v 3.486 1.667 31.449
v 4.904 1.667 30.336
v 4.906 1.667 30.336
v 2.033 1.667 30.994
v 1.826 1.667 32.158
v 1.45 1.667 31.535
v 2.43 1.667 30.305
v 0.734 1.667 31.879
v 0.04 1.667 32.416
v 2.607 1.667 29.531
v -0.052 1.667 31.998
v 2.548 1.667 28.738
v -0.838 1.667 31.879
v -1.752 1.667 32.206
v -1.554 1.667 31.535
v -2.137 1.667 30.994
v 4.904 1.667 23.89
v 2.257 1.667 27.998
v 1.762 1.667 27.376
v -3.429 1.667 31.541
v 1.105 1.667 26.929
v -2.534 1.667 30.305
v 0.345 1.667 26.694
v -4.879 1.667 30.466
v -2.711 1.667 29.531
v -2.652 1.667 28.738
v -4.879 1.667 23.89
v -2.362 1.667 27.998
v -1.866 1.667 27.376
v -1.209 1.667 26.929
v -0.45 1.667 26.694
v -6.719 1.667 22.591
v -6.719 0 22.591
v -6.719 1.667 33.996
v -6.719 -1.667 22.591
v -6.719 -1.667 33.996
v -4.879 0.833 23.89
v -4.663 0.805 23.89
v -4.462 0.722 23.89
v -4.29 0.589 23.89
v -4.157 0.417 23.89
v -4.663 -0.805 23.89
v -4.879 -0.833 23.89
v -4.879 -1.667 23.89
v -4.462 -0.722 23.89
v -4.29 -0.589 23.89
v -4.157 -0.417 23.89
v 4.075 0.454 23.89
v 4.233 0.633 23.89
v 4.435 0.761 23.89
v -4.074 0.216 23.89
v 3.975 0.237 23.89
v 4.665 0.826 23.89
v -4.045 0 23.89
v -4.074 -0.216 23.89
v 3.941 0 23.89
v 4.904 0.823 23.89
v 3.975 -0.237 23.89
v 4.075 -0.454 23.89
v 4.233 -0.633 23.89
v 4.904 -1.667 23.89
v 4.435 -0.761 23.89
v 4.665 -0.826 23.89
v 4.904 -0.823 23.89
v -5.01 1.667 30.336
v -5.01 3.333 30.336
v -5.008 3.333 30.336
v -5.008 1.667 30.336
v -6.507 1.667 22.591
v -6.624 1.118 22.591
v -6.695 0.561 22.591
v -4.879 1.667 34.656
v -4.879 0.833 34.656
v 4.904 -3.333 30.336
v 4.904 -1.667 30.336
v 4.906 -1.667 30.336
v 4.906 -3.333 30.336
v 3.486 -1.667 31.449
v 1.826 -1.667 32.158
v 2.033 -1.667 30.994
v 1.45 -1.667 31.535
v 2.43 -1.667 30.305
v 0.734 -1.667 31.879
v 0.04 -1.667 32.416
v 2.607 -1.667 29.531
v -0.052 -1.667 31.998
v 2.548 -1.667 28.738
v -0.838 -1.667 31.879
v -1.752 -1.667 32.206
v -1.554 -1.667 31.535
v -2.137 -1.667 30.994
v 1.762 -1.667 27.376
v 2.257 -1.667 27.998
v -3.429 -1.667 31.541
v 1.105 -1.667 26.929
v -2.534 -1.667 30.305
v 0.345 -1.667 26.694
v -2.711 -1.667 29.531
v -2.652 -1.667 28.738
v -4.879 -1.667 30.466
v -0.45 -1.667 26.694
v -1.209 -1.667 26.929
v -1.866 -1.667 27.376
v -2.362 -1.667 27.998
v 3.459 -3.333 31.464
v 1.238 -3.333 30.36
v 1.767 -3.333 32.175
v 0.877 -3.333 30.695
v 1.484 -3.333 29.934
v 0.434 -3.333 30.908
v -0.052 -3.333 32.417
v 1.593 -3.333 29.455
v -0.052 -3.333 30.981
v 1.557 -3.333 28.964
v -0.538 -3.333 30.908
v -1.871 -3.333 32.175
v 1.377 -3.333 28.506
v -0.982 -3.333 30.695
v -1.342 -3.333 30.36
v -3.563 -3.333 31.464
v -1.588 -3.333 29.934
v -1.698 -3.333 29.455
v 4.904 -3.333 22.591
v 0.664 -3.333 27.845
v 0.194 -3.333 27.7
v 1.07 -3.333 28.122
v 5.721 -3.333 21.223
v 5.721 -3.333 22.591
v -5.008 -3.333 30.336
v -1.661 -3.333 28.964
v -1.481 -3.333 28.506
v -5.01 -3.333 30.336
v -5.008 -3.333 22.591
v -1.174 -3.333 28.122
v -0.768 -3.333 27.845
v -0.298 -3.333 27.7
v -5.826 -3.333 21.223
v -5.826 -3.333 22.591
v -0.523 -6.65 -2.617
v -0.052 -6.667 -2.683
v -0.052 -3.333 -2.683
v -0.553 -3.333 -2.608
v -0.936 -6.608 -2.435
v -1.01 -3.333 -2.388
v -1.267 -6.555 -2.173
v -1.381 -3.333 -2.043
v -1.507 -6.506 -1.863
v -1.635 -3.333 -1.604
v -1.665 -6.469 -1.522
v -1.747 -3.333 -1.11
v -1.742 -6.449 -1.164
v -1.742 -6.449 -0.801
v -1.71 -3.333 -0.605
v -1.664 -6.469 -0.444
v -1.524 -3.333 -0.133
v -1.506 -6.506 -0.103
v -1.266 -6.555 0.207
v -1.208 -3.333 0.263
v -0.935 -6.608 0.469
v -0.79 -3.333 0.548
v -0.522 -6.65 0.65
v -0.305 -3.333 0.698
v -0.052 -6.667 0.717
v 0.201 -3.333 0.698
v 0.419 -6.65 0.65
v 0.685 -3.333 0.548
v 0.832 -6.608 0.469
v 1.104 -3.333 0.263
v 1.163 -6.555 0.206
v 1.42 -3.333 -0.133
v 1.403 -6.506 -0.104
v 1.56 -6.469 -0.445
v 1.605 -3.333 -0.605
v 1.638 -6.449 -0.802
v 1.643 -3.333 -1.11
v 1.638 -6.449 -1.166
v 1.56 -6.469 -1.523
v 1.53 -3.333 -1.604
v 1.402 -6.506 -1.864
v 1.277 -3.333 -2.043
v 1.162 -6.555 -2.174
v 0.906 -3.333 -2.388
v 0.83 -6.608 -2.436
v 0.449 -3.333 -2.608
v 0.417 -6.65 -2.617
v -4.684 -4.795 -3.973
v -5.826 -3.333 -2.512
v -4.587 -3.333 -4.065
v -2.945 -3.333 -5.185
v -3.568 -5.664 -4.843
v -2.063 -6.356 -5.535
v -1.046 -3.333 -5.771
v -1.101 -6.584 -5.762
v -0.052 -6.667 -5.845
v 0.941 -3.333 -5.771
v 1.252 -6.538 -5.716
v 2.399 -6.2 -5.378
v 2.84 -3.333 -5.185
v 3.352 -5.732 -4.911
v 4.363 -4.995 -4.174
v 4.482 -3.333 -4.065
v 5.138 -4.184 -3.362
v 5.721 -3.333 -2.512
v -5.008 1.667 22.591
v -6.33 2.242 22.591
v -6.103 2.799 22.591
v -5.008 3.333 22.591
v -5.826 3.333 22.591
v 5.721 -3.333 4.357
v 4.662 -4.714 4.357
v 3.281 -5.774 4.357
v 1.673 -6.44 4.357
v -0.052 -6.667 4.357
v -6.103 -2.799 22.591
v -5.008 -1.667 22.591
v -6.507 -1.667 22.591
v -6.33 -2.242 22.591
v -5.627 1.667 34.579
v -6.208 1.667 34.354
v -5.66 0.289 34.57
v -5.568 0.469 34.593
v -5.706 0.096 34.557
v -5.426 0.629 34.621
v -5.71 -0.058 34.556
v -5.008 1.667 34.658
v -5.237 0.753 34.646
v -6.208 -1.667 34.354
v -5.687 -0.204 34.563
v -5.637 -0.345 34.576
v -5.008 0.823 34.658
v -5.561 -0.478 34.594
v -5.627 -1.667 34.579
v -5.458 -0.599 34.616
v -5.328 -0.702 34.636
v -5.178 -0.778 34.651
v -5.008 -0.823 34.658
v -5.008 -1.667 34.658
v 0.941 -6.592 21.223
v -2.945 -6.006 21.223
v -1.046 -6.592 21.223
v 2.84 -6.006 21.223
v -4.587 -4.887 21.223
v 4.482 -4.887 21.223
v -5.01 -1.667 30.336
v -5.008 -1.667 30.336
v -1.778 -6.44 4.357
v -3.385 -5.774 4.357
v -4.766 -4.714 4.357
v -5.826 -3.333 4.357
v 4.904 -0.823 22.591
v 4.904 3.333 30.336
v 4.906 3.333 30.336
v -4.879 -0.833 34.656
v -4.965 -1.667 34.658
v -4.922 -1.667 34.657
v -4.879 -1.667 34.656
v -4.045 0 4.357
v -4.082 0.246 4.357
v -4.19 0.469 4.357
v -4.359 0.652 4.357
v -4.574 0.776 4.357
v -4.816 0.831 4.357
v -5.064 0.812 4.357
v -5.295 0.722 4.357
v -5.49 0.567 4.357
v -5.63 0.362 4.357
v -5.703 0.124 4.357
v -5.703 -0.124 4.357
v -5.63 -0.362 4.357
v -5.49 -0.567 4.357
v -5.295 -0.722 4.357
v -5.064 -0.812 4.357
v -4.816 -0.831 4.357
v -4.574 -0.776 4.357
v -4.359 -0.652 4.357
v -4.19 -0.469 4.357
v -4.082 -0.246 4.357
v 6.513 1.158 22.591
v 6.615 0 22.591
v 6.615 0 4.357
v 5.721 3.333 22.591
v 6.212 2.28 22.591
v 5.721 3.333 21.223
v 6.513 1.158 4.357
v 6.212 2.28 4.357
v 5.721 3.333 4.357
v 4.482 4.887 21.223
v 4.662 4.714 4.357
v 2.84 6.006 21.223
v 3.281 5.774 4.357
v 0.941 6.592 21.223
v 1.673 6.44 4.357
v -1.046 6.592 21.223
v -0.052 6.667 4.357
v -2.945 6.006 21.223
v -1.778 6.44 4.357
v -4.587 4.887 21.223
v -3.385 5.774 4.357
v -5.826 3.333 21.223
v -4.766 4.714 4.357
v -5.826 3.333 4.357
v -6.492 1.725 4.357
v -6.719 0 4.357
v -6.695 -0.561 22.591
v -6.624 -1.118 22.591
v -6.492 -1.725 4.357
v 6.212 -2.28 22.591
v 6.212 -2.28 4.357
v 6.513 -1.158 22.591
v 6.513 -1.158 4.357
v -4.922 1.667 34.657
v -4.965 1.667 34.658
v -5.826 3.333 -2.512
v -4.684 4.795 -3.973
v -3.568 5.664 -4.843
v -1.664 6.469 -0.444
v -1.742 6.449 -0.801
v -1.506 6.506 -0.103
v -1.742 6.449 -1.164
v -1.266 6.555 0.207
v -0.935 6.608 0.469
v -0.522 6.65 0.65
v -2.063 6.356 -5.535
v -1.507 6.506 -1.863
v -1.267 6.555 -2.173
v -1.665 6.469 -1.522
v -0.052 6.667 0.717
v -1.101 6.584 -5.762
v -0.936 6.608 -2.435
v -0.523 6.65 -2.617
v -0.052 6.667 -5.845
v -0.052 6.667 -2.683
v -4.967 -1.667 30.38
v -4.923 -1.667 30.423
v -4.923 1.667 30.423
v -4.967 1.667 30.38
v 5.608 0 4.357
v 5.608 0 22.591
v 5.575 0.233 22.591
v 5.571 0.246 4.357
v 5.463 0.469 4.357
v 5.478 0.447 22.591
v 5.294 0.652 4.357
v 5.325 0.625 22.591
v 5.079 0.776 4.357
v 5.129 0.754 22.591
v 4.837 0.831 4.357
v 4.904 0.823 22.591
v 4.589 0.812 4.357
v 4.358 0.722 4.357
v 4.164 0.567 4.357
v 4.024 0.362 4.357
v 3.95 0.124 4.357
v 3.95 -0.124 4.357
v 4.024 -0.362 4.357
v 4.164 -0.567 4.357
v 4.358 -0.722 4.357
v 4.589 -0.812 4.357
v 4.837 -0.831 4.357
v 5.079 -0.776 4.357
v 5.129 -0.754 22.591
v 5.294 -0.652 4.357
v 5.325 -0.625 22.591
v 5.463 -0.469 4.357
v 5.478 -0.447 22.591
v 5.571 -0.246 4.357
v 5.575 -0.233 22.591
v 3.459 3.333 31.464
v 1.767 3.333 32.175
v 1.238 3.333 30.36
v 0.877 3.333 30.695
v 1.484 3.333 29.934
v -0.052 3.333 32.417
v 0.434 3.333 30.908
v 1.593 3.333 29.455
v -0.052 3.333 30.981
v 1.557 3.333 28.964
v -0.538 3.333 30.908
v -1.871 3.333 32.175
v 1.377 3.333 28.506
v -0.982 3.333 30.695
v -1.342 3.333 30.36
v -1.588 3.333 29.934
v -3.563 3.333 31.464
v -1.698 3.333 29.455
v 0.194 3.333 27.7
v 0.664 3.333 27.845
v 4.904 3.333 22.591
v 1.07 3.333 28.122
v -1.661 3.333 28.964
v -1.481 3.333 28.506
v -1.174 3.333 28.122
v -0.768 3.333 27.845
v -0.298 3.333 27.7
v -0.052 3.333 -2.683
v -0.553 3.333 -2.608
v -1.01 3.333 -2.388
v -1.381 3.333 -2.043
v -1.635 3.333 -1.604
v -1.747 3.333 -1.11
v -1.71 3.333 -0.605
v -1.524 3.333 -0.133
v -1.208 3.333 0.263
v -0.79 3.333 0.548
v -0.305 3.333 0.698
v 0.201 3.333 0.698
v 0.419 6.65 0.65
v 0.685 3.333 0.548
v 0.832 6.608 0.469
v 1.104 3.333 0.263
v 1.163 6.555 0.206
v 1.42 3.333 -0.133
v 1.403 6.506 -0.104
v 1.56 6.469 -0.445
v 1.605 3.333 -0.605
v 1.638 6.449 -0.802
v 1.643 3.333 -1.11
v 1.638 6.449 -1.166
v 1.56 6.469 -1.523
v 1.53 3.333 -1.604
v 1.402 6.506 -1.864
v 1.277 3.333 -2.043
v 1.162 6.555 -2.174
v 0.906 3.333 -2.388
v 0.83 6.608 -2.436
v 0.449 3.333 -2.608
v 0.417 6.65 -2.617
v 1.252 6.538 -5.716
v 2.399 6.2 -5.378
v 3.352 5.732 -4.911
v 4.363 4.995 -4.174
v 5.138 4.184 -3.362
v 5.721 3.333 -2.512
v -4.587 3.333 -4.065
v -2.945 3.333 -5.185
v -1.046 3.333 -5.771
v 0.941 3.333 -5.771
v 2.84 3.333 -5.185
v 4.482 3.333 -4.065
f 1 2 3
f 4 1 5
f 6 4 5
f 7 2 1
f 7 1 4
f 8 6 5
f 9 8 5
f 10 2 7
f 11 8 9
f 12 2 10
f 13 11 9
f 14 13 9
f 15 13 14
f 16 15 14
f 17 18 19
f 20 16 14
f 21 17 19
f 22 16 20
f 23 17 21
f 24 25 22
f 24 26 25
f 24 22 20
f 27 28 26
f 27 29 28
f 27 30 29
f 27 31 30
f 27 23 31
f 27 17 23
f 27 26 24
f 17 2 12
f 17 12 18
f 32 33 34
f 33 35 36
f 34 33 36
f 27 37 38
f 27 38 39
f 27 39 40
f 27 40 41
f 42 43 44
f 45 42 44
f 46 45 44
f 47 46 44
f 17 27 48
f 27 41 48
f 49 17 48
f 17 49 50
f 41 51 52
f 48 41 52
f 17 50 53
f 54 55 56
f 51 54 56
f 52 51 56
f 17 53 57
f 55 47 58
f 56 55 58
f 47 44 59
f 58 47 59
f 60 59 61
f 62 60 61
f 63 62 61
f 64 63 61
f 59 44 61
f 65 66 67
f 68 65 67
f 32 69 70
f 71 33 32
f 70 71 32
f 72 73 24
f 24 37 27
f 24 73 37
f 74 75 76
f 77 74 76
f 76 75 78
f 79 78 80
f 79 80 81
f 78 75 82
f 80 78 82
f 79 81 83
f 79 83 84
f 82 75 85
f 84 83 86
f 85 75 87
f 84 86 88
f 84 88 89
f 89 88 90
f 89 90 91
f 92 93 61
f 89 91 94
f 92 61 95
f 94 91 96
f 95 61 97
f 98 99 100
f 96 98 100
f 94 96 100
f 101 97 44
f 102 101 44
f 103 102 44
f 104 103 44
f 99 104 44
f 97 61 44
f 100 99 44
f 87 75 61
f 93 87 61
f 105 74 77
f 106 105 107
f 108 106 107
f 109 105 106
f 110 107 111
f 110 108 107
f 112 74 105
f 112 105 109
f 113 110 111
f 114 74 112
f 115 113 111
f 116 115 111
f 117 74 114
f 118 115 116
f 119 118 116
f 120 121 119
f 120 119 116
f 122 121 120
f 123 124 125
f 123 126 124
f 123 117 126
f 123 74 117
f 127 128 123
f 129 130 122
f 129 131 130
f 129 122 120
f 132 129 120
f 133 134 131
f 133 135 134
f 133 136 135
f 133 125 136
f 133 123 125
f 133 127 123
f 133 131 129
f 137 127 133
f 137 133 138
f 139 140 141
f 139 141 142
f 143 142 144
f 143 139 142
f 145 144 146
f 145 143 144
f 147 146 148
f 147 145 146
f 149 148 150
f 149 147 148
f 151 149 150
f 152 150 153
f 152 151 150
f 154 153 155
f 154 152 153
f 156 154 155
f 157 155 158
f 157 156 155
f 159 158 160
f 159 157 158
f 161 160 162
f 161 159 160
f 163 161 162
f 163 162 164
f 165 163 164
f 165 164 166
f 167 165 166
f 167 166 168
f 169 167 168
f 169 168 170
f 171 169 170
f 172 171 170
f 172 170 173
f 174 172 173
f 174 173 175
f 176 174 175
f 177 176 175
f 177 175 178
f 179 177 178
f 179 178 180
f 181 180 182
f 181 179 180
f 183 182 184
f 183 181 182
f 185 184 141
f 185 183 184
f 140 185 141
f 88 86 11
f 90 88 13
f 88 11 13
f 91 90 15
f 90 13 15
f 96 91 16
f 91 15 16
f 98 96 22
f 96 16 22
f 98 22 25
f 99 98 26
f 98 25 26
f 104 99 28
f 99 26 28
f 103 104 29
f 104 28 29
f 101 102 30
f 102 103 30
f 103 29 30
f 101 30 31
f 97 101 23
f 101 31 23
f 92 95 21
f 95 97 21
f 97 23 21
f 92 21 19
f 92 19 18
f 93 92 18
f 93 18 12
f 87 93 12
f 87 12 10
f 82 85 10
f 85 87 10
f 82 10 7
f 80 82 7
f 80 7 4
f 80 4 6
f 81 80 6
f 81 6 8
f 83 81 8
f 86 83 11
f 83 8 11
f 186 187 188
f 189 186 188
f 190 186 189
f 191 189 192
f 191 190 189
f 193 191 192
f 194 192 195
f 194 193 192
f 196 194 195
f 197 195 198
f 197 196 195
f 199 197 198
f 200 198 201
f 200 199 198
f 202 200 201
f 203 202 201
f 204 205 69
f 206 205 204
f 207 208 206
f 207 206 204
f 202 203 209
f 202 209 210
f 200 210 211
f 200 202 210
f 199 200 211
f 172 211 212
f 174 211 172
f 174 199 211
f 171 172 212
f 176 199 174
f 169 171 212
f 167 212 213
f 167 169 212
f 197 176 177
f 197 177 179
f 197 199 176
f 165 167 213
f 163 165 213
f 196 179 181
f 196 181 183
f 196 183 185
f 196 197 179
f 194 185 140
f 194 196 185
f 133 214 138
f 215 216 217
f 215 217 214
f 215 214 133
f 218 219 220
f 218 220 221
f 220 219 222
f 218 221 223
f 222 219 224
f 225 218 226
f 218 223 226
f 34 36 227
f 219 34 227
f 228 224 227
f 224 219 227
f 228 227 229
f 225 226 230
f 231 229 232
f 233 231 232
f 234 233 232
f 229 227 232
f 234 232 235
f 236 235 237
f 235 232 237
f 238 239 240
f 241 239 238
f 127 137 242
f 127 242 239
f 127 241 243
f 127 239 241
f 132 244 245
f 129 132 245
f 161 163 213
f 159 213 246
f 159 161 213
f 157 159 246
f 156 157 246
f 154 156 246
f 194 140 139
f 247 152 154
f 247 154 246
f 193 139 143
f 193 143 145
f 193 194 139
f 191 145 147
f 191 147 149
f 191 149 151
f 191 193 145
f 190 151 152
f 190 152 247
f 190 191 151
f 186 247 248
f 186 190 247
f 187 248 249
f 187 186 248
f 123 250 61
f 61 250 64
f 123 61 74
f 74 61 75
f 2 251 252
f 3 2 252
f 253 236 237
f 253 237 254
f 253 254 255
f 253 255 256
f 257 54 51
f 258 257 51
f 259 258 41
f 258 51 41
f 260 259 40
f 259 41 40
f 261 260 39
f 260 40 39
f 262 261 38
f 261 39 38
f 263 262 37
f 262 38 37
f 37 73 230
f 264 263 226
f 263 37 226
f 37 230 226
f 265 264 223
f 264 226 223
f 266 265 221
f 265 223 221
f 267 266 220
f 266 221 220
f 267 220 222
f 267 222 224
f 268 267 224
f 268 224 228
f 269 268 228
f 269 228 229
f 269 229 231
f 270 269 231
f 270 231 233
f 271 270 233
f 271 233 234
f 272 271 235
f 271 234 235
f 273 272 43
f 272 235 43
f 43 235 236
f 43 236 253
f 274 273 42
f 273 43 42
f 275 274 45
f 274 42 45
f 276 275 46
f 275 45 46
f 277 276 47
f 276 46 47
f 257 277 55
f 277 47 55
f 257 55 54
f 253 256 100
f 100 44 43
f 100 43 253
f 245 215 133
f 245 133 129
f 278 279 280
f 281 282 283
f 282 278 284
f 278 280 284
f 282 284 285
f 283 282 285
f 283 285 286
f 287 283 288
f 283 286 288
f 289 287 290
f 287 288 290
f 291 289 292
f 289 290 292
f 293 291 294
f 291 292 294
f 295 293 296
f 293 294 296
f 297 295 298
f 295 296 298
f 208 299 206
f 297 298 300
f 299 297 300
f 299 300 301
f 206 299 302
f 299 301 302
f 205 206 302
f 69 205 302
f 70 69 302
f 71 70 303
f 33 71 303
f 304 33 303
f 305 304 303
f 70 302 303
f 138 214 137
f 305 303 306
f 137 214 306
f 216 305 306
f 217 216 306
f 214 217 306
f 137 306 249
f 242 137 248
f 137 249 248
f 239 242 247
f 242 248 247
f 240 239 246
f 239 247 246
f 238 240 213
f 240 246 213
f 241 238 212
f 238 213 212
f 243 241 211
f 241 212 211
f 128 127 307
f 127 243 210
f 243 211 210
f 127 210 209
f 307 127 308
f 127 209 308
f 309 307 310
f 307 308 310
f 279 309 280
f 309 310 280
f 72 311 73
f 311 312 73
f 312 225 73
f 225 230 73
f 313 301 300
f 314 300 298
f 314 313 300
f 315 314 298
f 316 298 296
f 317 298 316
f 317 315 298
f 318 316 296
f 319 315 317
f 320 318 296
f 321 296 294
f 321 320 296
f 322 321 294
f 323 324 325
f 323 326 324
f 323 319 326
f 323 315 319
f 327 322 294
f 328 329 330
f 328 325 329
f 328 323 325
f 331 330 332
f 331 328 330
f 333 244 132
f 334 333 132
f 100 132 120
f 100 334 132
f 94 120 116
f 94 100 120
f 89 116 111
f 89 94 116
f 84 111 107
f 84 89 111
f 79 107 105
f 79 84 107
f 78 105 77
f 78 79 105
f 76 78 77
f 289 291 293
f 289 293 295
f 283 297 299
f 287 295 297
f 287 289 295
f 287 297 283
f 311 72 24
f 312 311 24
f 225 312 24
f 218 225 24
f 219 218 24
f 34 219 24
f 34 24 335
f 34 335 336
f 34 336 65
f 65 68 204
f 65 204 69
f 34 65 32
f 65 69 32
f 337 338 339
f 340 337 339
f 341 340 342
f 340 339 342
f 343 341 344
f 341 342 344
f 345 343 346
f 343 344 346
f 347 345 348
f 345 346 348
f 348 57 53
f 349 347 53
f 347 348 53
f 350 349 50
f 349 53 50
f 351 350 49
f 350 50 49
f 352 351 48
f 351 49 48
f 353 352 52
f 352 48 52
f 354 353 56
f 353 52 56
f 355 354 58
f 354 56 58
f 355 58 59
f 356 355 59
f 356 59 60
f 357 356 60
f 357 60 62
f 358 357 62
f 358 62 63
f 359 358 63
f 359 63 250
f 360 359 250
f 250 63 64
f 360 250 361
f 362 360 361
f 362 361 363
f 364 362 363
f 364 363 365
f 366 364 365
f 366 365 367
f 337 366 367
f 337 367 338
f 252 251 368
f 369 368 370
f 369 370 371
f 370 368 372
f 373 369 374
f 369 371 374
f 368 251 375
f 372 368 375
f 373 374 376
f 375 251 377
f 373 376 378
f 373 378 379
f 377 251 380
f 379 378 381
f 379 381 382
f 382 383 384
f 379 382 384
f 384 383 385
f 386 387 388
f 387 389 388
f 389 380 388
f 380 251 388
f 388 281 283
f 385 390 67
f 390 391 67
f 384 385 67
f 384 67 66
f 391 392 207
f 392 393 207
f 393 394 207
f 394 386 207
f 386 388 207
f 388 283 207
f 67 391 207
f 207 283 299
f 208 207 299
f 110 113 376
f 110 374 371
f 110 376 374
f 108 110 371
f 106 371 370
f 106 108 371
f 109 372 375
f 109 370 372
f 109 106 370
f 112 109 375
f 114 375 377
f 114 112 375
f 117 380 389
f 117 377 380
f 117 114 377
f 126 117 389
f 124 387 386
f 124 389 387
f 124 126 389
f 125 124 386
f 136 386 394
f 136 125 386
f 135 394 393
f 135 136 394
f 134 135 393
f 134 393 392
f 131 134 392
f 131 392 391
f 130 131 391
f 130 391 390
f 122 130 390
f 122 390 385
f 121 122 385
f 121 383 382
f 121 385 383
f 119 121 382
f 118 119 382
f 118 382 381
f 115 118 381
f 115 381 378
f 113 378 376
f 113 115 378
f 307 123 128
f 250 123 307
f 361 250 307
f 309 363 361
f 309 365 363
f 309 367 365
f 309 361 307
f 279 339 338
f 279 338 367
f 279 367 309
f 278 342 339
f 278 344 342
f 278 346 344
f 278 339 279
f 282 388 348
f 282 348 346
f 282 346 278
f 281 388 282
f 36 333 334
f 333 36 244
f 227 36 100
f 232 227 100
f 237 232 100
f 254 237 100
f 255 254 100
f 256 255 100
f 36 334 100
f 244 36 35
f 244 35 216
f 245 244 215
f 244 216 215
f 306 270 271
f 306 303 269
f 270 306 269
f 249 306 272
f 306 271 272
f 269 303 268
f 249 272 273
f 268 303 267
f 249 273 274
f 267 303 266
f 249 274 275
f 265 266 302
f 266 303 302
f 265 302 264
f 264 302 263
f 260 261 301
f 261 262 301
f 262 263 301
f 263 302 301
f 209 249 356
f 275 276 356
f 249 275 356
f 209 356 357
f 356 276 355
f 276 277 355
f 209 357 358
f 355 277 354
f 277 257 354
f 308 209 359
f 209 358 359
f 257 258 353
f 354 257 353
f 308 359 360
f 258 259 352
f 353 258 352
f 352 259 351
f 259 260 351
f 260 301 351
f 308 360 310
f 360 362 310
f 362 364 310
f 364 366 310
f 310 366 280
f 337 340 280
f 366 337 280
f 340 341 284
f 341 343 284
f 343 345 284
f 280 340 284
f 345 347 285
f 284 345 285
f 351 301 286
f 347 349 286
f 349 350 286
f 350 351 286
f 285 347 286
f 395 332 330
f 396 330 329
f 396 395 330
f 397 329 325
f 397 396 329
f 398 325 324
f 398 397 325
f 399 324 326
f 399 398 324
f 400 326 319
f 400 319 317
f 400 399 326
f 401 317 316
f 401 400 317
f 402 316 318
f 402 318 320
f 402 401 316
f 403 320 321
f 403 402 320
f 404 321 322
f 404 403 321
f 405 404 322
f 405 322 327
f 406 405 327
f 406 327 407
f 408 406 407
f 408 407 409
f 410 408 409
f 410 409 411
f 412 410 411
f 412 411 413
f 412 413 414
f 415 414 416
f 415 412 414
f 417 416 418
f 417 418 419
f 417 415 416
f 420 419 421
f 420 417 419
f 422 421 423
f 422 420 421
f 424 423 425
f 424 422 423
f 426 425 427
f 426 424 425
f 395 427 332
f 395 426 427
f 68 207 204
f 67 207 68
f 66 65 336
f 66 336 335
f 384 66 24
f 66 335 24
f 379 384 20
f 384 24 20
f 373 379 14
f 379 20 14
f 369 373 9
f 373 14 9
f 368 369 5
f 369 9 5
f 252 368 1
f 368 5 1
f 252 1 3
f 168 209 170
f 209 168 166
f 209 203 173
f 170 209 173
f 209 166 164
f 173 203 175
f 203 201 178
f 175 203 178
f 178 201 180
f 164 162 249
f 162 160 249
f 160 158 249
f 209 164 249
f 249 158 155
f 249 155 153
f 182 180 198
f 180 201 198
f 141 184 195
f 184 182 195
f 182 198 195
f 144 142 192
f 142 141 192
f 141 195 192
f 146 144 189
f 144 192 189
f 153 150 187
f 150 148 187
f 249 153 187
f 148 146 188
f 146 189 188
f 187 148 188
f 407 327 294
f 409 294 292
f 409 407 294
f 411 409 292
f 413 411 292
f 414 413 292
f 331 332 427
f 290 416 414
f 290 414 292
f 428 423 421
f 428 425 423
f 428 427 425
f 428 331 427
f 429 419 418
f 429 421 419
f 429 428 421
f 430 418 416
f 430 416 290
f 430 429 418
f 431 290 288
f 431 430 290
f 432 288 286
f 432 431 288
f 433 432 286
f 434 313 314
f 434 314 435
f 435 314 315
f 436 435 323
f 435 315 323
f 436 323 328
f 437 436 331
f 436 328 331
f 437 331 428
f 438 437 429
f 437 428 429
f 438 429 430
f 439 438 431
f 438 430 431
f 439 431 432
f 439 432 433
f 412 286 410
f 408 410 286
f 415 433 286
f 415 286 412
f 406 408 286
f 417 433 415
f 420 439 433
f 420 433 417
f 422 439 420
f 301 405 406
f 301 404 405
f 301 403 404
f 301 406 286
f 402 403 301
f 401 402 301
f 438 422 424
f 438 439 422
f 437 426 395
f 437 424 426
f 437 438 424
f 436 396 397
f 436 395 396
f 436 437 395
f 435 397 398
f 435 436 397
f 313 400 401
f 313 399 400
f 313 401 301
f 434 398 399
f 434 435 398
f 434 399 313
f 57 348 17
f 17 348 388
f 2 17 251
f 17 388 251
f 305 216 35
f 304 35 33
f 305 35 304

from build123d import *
from build123d.topology import SkipClean

# Parameters (mm, degrees)
SKETCH2_R                       = 10
PHALANGE_LENGTH_DEPTH           = 29.3
BOSS_EXTRUDE3_DEPTH             = 5
BOSS_EXTRUDE4_DEPTH             = 5
BOSS_EXTRUDE4_DEPTH_BACK        = 5
CUT_EXTRUDE2_START              = -15.3025
CUT_EXTRUDE2_DEPTH              = 15.3025
SKETCH7_R                       = 1.65
CUT_EXTRUDE3_DEPTH              = 10
CUT_EXTRUDE4_DEPTH              = 2.5
CUT_EXTRUDE4_DEPTH_BACK         = 2.5
CUT_EXTRUDE7_REACH              = 50.154
SKETCH4_R                       = 1.65
CUT_EXTRUDE7_DIRECTION_2_REACH  = 50.154
CUT_EXTRUDE_THIN1_START         = 29.3
CUT_EXTRUDE_THIN1_DEPTH         = 10.361670454
BOSS_EXTRUDE5_REACH             = 49.435
SKETCH9_R                       = 4
SKETCH9_R_2                     = 1.65
CUT_EXTRUDE8_REACH              = 48.791
SKETCH10_R                      = 1.25
CUT_EXTRUDE9_START              = -4
CUT_EXTRUDE9_DEPTH              = 4
CUT_EXTRUDE10_REACH             = 49.435
CUT_EXTRUDE10_DIRECTION_2_REACH = 49.435
CUT_EXTRUDE11_START             = -10
CUT_EXTRUDE11_OUTLINE_W         = 2.565773848
CUT_EXTRUDE11_OUTLINE_H         = 11.6166929
CUT_EXTRUDE11_DEPTH             = 10
BOSS_EXTRUDE7_REACH             = 47.032
CUT_EXTRUDE12_REACH             = 48.791
SKETCH10_2_R                    = 1.25
CUT_EXTRUDE12_DIRECTION_2_REACH = 48.791
SKETCH17_R                      = 1.25
SKETCH17_W                      = 2.42123439
SKETCH17_H                      = 5
CUT_EXTRUDE14_DEPTH             = 16.148519
SCALE1_SCALE                    = 0.666666667
CUT_EXTRUDE15_START             = -10
SKETCH18_R                      = 1.65
CUT_EXTRUDE15_DEPTH             = 13.333338
CUT_EXTRUDE16_START             = -3.333333
SKETCH19_R                      = 1.7
CUT_EXTRUDE16_DEPTH             = 13.333338


# Read off the part's stored shape, not the designer's step: Cut-Extrude-Thin1, Cut-Extrude11
with BuildPart() as part:
    # Sketch2 → Phalange Length (new body)
    with BuildSketch(Plane.XY):
        Circle(SKETCH2_R)
    extrude(amount=PHALANGE_LENGTH_DEPTH)

    # Sketch3 → Boss-Extrude3 (add)
    with BuildSketch(Plane(origin=(0, -10, 0), x_dir=(-1, 0, 0), z_dir=(0, -1, 0))):
        with BuildLine():
            Line((-10, 5.302499701), (-10, 0))
            Line((-10, 0), (10, 0))
            Line((10, 0), (10, 5.302499701))
            ThreePointArc((10, 5.302499701), (0, 15.302499701), (-10, 5.302499701))
        make_face()
    boss_extrude3 = extrude(amount=-BOSS_EXTRUDE3_DEPTH)

    # Mirror1: Boss-Extrude3 across plane
    add(boss_extrude3.mirror(Plane.ZX))

    # Sketch5 → Boss-Extrude4 (add, two sides: drawn at the far end of the back side and taken through both)
    with BuildSketch(Plane(origin=(0, 0, 0), x_dir=(1, 0, 0), z_dir=(0, 1, 0)).offset(-BOSS_EXTRUDE4_DEPTH_BACK)):
        with BuildLine():
            Line((-10, -35.083157911), (-10, -29.3))
            Line((-10, -29.3), (10, -29.3))
            Line((10, -29.3), (10, -35.083157911))
            ThreePointArc((10, -35.083157911), (0, -44.651984156), (-10, -35.083157911))
        make_face()
    extrude(amount=BOSS_EXTRUDE4_DEPTH + BOSS_EXTRUDE4_DEPTH_BACK)

    # Sketch6 → Cut-Extrude2 (cut)
    with SkipClean():  # the faces are left unmerged after this step: merging them gives an invalid solid
        with BuildSketch(Plane.XY.offset(CUT_EXTRUDE2_START)):
            with BuildLine():
                ThreePointArc((0, 10), (5, 8.660254038), (8.660254038, 5))
                Line((8.660254038, 5), (10, 5))
                Line((10, 5), (10, 10))
                Line((10, 10), (0, 10))
            make_face()
            with BuildLine():
                Line((10, -5), (8.660254038, -5))
                ThreePointArc((8.660254038, -5), (5, -8.660254038), (0, -10))
                Line((0, -10), (10, -10))
                Line((10, -10), (10, -5))
            make_face()
            with BuildLine():
                ThreePointArc((-8.660254038, 5), (-5, 8.660254038), (0, 10))
                Line((0, 10), (-10, 10))
                Line((-10, 10), (-10, 5))
                Line((-10, 5), (-8.660254038, 5))
            make_face()
            with BuildLine():
                Line((-10, -10), (0, -10))
                ThreePointArc((0, -10), (-5, -8.660254038), (-8.660254038, -5))
                Line((-8.660254038, -5), (-10, -5))
                Line((-10, -5), (-10, -10))
            make_face()
        extrude(amount=CUT_EXTRUDE2_DEPTH, mode=Mode.SUBTRACT)

    # Sketch7 → Cut-Extrude3 (cut)
    with SkipClean():  # the faces are left unmerged after this step: merging them gives an invalid solid
        with BuildSketch(Plane(origin=(0, 5, 0), x_dir=(1, 0, 0), z_dir=(0, 1, 0))):
            with Locations(Location((0, -37.461984156, 0), (0, 0, 270))):
                Circle(SKETCH7_R)
        extrude(amount=-CUT_EXTRUDE3_DEPTH, mode=Mode.SUBTRACT)

    # Sketch5<2> → Cut-Extrude4 (cut, two sides: drawn at the far end of the back side and taken through both)
    with BuildSketch(Plane(origin=(0, 0, 0), x_dir=(1, 0, 0), z_dir=(0, 1, 0)).offset(-CUT_EXTRUDE4_DEPTH_BACK)):
        with BuildLine():
            Line((-10, -35.083157911), (-10, -29.3))
            Line((-10, -29.3), (10, -29.3))
            Line((10, -29.3), (10, -35.083157911))
            ThreePointArc((10, -35.083157911), (0, -44.651984156), (-10, -35.083157911))
        make_face()
    extrude(amount=CUT_EXTRUDE4_DEPTH + CUT_EXTRUDE4_DEPTH_BACK, mode=Mode.SUBTRACT)

    # Sketch4 → Cut-Extrude7 (cut, up to next)
    with BuildSketch(Plane(origin=(0, -5, 0), x_dir=(1, 0, 0), z_dir=(0, 1, 0)), mode=Mode.PRIVATE) as cut_extrude7_sk1:
        with Locations(Location((0, 8.010159673, 0), (0, 0, 270))):
            Circle(SKETCH4_R)
    cut_extrude7_tool1 = extrude(cut_extrude7_sk1.sketch, amount=-CUT_EXTRUDE7_REACH, mode=Mode.PRIVATE) & part.part
    add(cut_extrude7_tool1.solids().sort_by_distance((0, -5, -8.01016))[0], mode=Mode.SUBTRACT)

    # Sketch4 → Cut-Extrude7 direction 2 (cut, up to next)
    with BuildSketch(Plane(origin=(0, -5, 0), x_dir=(1, 0, 0), z_dir=(0, 1, 0)), mode=Mode.PRIVATE) as cut_extrude7_direction_2_sk1:
        with Locations(Location((0, 8.010159673, 0), (0, 0, 270))):
            Circle(SKETCH4_R)
    cut_extrude7_direction_2_tool1 = extrude(cut_extrude7_direction_2_sk1.sketch, amount=CUT_EXTRUDE7_DIRECTION_2_REACH, mode=Mode.PRIVATE) & part.part
    add(cut_extrude7_direction_2_tool1.solids().sort_by_distance((0, -5, -8.01016))[0], mode=Mode.SUBTRACT)

    # Cut-Extrude-Thin1 outline → Cut-Extrude-Thin1 (cut)
    with SkipClean():  # the faces are left unmerged after this step: merging them gives an invalid solid
        with BuildSketch(Plane.XY.offset(CUT_EXTRUDE_THIN1_START)):
            with BuildLine():
                ThreePointArc((8.660254038, 5), (9.256147934, 3.78466979), (9.682458366, 2.5))
                Line((9.682458366, 2.5), (10, 2.5))
                Line((10, 2.5), (10, 5))
                Line((10, 5), (8.660254038, 5))
            make_face()
            with BuildLine():
                Line((10, -2.5), (9.682458366, -2.5))
                ThreePointArc((9.682458366, -2.5), (9.256147934, -3.78466979), (8.660254038, -5))
                Line((8.660254038, -5), (10, -5))
                Line((10, -5), (10, -2.5))
            make_face()
            with BuildLine():
                Line((-10, 2.5), (-9.682458366, 2.5))
                ThreePointArc((-9.682458366, 2.5), (-9.256147934, 3.78466979), (-8.660254038, 5))
                Line((-8.660254038, 5), (-10, 5))
                Line((-10, 5), (-10, 2.5))
            make_face()
            with BuildLine():
                ThreePointArc((-8.660254038, -5), (-9.256147934, -3.78466979), (-9.682458366, -2.5))
                Line((-9.682458366, -2.5), (-10, -2.5))
                Line((-10, -2.5), (-10, -5))
                Line((-10, -5), (-8.660254038, -5))
            make_face()
        extrude(amount=CUT_EXTRUDE_THIN1_DEPTH, mode=Mode.SUBTRACT)

    # Sketch9 → Boss-Extrude5 (add, up to next)
    with BuildSketch(Plane.XZ.offset(-2.5), mode=Mode.PRIVATE) as boss_extrude5_sk1:
        with Locations(Location((0, 37.461984156, 0), (0, 0, 90))):
            Circle(SKETCH9_R)
        with Locations(Location((0, 37.461984156, 0), (0, 0, 90))):
            Circle(SKETCH9_R_2, mode=Mode.SUBTRACT)
    boss_extrude5_tool1 = extrude(boss_extrude5_sk1.sketch, amount=BOSS_EXTRUDE5_REACH, mode=Mode.PRIVATE) - part.part
    add(boss_extrude5_tool1.solids().sort_by_distance((0, 2.5, 33.575121))[0])

    # Sketch10 → Cut-Extrude8 (cut, up to next)
    with BuildSketch(Plane.XY.offset(29.3), mode=Mode.PRIVATE) as cut_extrude8_sk1:
        with Locations((7.239961745, 0)):
            Circle(SKETCH10_R)
    cut_extrude8_tool1 = extrude(cut_extrude8_sk1.sketch, amount=-CUT_EXTRUDE8_REACH, mode=Mode.PRIVATE) & part.part
    # Sketch10 → Cut-Extrude8 (cut, up to next)
    with BuildSketch(Plane.XY.offset(29.3), mode=Mode.PRIVATE) as cut_extrude8_sk2:
        with Locations((-7.239961745, 0)):
            Circle(SKETCH10_R)
    cut_extrude8_tool2 = extrude(cut_extrude8_sk2.sketch, amount=-CUT_EXTRUDE8_REACH, mode=Mode.PRIVATE) & part.part
    add(cut_extrude8_tool1.solids().sort_by_distance((7.239962, 0, 29.3))[0], mode=Mode.SUBTRACT)
    add(cut_extrude8_tool2.solids().sort_by_distance((-7.239962, 0, 29.3))[0], mode=Mode.SUBTRACT)

    # Sketch11 → Cut-Extrude9 (cut)
    with SkipClean():  # the faces are left unmerged after this step: merging them gives an invalid solid
        with BuildSketch(Plane.XY.offset(29.3).offset(CUT_EXTRUDE9_START)):
            with BuildLine():
                ThreePointArc((8.660254038, 5), (0, 10), (-8.660254038, 5))
                Line((-8.660254038, 5), (8.660254038, 5))
            make_face()
            with BuildLine():
                Line((8.660254038, -5), (-8.660254038, -5))
                ThreePointArc((-8.660254038, -5), (0, -10), (8.660254038, -5))
            make_face()
        extrude(amount=CUT_EXTRUDE9_DEPTH, mode=Mode.SUBTRACT)

    # Sketch12 → Cut-Extrude10 (cut, up to next)
    with BuildSketch(Plane.XZ.offset(-2.5), mode=Mode.PRIVATE) as cut_extrude10_sk1:
        with BuildLine():
            Line((-10.033719202, 44.651984156), (-10.033719202, 37.464892021))
            Line((-10.033719202, 37.464892021), (-8.660254038, 37.464892021))
            ThreePointArc((-8.660254038, 37.464892021), (0, 42.090740593), (8.660254038, 37.464892021))
            Line((8.660254038, 37.464892021), (10.033719202, 37.464892021))
            Line((10.033719202, 37.464892021), (10.033719202, 44.651984156))
            Line((10.033719202, 44.651984156), (-10.033719202, 44.651984156))
        make_face()
    cut_extrude10_tool1 = extrude(cut_extrude10_sk1.sketch, amount=CUT_EXTRUDE10_REACH, mode=Mode.PRIVATE) & part.part
    add(cut_extrude10_tool1.solids().sort_by_distance((0, 2.5, 42.150279))[0], mode=Mode.SUBTRACT)

    # Sketch12 → Cut-Extrude10 direction 2 (cut, up to next)
    with BuildSketch(Plane.XZ.offset(-2.5), mode=Mode.PRIVATE) as cut_extrude10_direction_2_sk1:
        with BuildLine():
            Line((-10.033719202, 44.651984156), (-10.033719202, 37.464892021))
            Line((-10.033719202, 37.464892021), (-8.660254038, 37.464892021))
            ThreePointArc((-8.660254038, 37.464892021), (0, 42.090740593), (8.660254038, 37.464892021))
            Line((8.660254038, 37.464892021), (10.033719202, 37.464892021))
            Line((10.033719202, 37.464892021), (10.033719202, 44.651984156))
            Line((10.033719202, 44.651984156), (-10.033719202, 44.651984156))
        make_face()
    cut_extrude10_direction_2_tool1 = extrude(cut_extrude10_direction_2_sk1.sketch, amount=-CUT_EXTRUDE10_DIRECTION_2_REACH, mode=Mode.PRIVATE) & part.part
    add(cut_extrude10_direction_2_tool1.solids().sort_by_distance((0, 2.5, 42.150279))[0], mode=Mode.SUBTRACT)

    # Cut-Extrude11 outline → Cut-Extrude11 (cut)
    with BuildSketch(Plane.XZ.offset(5).offset(CUT_EXTRUDE11_START)):
        with Locations((-8.717113076, 33.160571369)):
            Rectangle(CUT_EXTRUDE11_OUTLINE_W, CUT_EXTRUDE11_OUTLINE_H)
        with Locations((8.717113076, 33.160571369)):
            Rectangle(CUT_EXTRUDE11_OUTLINE_W, CUT_EXTRUDE11_OUTLINE_H)
    extrude(amount=CUT_EXTRUDE11_DEPTH, mode=Mode.SUBTRACT)

    # Boss-Extrude7: up to this face of the body (flat: up to its plane)
    boss_extrude7_end = Plane(part.part.faces().sort_by_distance((0, 2.5, 29.496174341))[0])
    # Sketch16 → Boss-Extrude7 (add, up to the picked face)
    with BuildSketch(Plane(origin=(0, -2.5, 0), x_dir=(1, 0, 0), z_dir=(0, 1, 0)), mode=Mode.PRIVATE) as boss_extrude7_sk1:
        with BuildLine():
            Line((-4.818727355, -27.352224919), (-7.434226152, -27.352224919))
            Line((-7.434226152, -27.352224919), (-10, -27.352224919))
            Line((-10, -27.352224919), (-10, -44.458561033))
            ThreePointArc((-10, -44.458561033), (-8.808295471, -45.190817912), (-7.43422564, -45.452145139))
            ThreePointArc((-7.43422564, -45.452145139), (-6.033645007, -45.199721533), (-4.818727355, -44.458561033))
            Line((-4.818727355, -44.458561033), (-4.818727355, -40.909527951))
            ThreePointArc((-4.818727355, -40.909527951), (-6.204248493, -40.042230104), (-7.437080645, -38.968917819))
            Line((-7.437080645, -38.968917819), (-7.434226152, -38.968917819))
            Line((-7.434226152, -38.968917819), (-7.434226152, -29.3))
            Line((-7.434226152, -29.3), (-4.818727355, -29.3))
            Line((-4.818727355, -29.3), (-4.818727355, -27.352224919))
        make_face()
    boss_extrude7_tool1 = split(extrude(boss_extrude7_sk1.sketch, amount=BOSS_EXTRUDE7_REACH, mode=Mode.PRIVATE), bisect_by=boss_extrude7_end, keep=Keep.BOTH, mode=Mode.PRIVATE)
    # Sketch16 → Boss-Extrude7 (add, up to the picked face)
    with BuildSketch(Plane(origin=(0, -2.5, 0), x_dir=(1, 0, 0), z_dir=(0, 1, 0)), mode=Mode.PRIVATE) as boss_extrude7_sk2:
        with BuildLine():
            Line((-4.818727355, -40.909527951), (-4.818727355, -29.3))
            Line((-4.818727355, -29.3), (-7.434226152, -29.3))
            Line((-7.434226152, -29.3), (-7.434226152, -38.968917819))
            Line((-7.434226152, -38.968917819), (-7.437080645, -38.968917819))
            ThreePointArc((-7.437080645, -38.968917819), (-6.204248493, -40.042230104), (-4.818727355, -40.909527951))
        make_face()
    boss_extrude7_tool2 = split(extrude(boss_extrude7_sk2.sketch, amount=BOSS_EXTRUDE7_REACH, mode=Mode.PRIVATE), bisect_by=boss_extrude7_end, keep=Keep.BOTH, mode=Mode.PRIVATE)
    add(boss_extrude7_tool1.solids().sort_by(Axis((-7.989429, -2.5, 36.933344), (0, 1, 0)))[0])
    add(boss_extrude7_tool2.solids().sort_by(Axis((-6.08748, -2.5, 34.6879), (0, 1, 0)))[0])

    # Sketch10<2> → Cut-Extrude12 (cut, up to next)
    with BuildSketch(Plane.XY.offset(29.3), mode=Mode.PRIVATE) as cut_extrude12_sk1:
        with Locations((-7.239961745, 0)):
            Circle(SKETCH10_2_R)
    cut_extrude12_tool1 = extrude(cut_extrude12_sk1.sketch, amount=CUT_EXTRUDE12_REACH, mode=Mode.PRIVATE) & part.part
    add(cut_extrude12_tool1.solids().sort_by_distance((-7.239962, 0, 29.3))[0], mode=Mode.SUBTRACT)

    # Sketch10<2> → Cut-Extrude12 direction 2 (cut, up to next)
    with BuildSketch(Plane.XY.offset(29.3), mode=Mode.PRIVATE) as cut_extrude12_direction_2_sk1:
        with Locations((-7.239961745, 0)):
            Circle(SKETCH10_2_R)
    cut_extrude12_direction_2_tool1 = extrude(cut_extrude12_direction_2_sk1.sketch, amount=-CUT_EXTRUDE12_DIRECTION_2_REACH, mode=Mode.PRIVATE) & part.part
    add(cut_extrude12_direction_2_tool1.solids().sort_by_distance((-7.239962, 0, 29.3))[0], mode=Mode.SUBTRACT)

    # Sketch17 → Cut-Extrude14 (cut)
    with SkipClean():  # the faces are left unmerged after this step: merging them gives an invalid solid
        with BuildSketch(Plane.XY.offset(29.3)):
            with Locations((-7.239961745, 0)):
                Circle(SKETCH17_R)
            with Locations((-6.02934455, 0)):
                Rectangle(SKETCH17_W, SKETCH17_H)
        extrude(amount=CUT_EXTRUDE14_DEPTH, mode=Mode.SUBTRACT)


with BuildPart() as part_1:
    # Scale1: scaled about (-0.156357219, -1.47e-07, 13.069731507)
    add(part.part.scale(SCALE1_SCALE).moved(Location((-0.052119073, -4.9e-08, 4.356577169))))

    # Sketch18 → Cut-Extrude15 (cut)
    with BuildSketch(Plane(origin=(0, 3.333328625, 0), x_dir=(1, 0, 0), z_dir=(0, 1, 0)).offset(CUT_EXTRUDE15_START)):
        with Locations(Location((-0.052127481, -29.331401561, 0), (0, 0, 270))):
            Circle(SKETCH18_R)
    extrude(amount=CUT_EXTRUDE15_DEPTH, mode=Mode.SUBTRACT)

    # Sketch19 → Cut-Extrude16 (cut)
    with BuildSketch(Plane(origin=(0, -3.333338042, 0), x_dir=(1, 0, 0), z_dir=(0, 1, 0)).offset(CUT_EXTRUDE16_START)):
        with Locations(Location((-0.052127481, 0.983360992, 0), (0, 0, 90))):
            Circle(SKETCH19_R)
    extrude(amount=CUT_EXTRUDE16_DEPTH, mode=Mode.SUBTRACT)


solid = part_1.part
